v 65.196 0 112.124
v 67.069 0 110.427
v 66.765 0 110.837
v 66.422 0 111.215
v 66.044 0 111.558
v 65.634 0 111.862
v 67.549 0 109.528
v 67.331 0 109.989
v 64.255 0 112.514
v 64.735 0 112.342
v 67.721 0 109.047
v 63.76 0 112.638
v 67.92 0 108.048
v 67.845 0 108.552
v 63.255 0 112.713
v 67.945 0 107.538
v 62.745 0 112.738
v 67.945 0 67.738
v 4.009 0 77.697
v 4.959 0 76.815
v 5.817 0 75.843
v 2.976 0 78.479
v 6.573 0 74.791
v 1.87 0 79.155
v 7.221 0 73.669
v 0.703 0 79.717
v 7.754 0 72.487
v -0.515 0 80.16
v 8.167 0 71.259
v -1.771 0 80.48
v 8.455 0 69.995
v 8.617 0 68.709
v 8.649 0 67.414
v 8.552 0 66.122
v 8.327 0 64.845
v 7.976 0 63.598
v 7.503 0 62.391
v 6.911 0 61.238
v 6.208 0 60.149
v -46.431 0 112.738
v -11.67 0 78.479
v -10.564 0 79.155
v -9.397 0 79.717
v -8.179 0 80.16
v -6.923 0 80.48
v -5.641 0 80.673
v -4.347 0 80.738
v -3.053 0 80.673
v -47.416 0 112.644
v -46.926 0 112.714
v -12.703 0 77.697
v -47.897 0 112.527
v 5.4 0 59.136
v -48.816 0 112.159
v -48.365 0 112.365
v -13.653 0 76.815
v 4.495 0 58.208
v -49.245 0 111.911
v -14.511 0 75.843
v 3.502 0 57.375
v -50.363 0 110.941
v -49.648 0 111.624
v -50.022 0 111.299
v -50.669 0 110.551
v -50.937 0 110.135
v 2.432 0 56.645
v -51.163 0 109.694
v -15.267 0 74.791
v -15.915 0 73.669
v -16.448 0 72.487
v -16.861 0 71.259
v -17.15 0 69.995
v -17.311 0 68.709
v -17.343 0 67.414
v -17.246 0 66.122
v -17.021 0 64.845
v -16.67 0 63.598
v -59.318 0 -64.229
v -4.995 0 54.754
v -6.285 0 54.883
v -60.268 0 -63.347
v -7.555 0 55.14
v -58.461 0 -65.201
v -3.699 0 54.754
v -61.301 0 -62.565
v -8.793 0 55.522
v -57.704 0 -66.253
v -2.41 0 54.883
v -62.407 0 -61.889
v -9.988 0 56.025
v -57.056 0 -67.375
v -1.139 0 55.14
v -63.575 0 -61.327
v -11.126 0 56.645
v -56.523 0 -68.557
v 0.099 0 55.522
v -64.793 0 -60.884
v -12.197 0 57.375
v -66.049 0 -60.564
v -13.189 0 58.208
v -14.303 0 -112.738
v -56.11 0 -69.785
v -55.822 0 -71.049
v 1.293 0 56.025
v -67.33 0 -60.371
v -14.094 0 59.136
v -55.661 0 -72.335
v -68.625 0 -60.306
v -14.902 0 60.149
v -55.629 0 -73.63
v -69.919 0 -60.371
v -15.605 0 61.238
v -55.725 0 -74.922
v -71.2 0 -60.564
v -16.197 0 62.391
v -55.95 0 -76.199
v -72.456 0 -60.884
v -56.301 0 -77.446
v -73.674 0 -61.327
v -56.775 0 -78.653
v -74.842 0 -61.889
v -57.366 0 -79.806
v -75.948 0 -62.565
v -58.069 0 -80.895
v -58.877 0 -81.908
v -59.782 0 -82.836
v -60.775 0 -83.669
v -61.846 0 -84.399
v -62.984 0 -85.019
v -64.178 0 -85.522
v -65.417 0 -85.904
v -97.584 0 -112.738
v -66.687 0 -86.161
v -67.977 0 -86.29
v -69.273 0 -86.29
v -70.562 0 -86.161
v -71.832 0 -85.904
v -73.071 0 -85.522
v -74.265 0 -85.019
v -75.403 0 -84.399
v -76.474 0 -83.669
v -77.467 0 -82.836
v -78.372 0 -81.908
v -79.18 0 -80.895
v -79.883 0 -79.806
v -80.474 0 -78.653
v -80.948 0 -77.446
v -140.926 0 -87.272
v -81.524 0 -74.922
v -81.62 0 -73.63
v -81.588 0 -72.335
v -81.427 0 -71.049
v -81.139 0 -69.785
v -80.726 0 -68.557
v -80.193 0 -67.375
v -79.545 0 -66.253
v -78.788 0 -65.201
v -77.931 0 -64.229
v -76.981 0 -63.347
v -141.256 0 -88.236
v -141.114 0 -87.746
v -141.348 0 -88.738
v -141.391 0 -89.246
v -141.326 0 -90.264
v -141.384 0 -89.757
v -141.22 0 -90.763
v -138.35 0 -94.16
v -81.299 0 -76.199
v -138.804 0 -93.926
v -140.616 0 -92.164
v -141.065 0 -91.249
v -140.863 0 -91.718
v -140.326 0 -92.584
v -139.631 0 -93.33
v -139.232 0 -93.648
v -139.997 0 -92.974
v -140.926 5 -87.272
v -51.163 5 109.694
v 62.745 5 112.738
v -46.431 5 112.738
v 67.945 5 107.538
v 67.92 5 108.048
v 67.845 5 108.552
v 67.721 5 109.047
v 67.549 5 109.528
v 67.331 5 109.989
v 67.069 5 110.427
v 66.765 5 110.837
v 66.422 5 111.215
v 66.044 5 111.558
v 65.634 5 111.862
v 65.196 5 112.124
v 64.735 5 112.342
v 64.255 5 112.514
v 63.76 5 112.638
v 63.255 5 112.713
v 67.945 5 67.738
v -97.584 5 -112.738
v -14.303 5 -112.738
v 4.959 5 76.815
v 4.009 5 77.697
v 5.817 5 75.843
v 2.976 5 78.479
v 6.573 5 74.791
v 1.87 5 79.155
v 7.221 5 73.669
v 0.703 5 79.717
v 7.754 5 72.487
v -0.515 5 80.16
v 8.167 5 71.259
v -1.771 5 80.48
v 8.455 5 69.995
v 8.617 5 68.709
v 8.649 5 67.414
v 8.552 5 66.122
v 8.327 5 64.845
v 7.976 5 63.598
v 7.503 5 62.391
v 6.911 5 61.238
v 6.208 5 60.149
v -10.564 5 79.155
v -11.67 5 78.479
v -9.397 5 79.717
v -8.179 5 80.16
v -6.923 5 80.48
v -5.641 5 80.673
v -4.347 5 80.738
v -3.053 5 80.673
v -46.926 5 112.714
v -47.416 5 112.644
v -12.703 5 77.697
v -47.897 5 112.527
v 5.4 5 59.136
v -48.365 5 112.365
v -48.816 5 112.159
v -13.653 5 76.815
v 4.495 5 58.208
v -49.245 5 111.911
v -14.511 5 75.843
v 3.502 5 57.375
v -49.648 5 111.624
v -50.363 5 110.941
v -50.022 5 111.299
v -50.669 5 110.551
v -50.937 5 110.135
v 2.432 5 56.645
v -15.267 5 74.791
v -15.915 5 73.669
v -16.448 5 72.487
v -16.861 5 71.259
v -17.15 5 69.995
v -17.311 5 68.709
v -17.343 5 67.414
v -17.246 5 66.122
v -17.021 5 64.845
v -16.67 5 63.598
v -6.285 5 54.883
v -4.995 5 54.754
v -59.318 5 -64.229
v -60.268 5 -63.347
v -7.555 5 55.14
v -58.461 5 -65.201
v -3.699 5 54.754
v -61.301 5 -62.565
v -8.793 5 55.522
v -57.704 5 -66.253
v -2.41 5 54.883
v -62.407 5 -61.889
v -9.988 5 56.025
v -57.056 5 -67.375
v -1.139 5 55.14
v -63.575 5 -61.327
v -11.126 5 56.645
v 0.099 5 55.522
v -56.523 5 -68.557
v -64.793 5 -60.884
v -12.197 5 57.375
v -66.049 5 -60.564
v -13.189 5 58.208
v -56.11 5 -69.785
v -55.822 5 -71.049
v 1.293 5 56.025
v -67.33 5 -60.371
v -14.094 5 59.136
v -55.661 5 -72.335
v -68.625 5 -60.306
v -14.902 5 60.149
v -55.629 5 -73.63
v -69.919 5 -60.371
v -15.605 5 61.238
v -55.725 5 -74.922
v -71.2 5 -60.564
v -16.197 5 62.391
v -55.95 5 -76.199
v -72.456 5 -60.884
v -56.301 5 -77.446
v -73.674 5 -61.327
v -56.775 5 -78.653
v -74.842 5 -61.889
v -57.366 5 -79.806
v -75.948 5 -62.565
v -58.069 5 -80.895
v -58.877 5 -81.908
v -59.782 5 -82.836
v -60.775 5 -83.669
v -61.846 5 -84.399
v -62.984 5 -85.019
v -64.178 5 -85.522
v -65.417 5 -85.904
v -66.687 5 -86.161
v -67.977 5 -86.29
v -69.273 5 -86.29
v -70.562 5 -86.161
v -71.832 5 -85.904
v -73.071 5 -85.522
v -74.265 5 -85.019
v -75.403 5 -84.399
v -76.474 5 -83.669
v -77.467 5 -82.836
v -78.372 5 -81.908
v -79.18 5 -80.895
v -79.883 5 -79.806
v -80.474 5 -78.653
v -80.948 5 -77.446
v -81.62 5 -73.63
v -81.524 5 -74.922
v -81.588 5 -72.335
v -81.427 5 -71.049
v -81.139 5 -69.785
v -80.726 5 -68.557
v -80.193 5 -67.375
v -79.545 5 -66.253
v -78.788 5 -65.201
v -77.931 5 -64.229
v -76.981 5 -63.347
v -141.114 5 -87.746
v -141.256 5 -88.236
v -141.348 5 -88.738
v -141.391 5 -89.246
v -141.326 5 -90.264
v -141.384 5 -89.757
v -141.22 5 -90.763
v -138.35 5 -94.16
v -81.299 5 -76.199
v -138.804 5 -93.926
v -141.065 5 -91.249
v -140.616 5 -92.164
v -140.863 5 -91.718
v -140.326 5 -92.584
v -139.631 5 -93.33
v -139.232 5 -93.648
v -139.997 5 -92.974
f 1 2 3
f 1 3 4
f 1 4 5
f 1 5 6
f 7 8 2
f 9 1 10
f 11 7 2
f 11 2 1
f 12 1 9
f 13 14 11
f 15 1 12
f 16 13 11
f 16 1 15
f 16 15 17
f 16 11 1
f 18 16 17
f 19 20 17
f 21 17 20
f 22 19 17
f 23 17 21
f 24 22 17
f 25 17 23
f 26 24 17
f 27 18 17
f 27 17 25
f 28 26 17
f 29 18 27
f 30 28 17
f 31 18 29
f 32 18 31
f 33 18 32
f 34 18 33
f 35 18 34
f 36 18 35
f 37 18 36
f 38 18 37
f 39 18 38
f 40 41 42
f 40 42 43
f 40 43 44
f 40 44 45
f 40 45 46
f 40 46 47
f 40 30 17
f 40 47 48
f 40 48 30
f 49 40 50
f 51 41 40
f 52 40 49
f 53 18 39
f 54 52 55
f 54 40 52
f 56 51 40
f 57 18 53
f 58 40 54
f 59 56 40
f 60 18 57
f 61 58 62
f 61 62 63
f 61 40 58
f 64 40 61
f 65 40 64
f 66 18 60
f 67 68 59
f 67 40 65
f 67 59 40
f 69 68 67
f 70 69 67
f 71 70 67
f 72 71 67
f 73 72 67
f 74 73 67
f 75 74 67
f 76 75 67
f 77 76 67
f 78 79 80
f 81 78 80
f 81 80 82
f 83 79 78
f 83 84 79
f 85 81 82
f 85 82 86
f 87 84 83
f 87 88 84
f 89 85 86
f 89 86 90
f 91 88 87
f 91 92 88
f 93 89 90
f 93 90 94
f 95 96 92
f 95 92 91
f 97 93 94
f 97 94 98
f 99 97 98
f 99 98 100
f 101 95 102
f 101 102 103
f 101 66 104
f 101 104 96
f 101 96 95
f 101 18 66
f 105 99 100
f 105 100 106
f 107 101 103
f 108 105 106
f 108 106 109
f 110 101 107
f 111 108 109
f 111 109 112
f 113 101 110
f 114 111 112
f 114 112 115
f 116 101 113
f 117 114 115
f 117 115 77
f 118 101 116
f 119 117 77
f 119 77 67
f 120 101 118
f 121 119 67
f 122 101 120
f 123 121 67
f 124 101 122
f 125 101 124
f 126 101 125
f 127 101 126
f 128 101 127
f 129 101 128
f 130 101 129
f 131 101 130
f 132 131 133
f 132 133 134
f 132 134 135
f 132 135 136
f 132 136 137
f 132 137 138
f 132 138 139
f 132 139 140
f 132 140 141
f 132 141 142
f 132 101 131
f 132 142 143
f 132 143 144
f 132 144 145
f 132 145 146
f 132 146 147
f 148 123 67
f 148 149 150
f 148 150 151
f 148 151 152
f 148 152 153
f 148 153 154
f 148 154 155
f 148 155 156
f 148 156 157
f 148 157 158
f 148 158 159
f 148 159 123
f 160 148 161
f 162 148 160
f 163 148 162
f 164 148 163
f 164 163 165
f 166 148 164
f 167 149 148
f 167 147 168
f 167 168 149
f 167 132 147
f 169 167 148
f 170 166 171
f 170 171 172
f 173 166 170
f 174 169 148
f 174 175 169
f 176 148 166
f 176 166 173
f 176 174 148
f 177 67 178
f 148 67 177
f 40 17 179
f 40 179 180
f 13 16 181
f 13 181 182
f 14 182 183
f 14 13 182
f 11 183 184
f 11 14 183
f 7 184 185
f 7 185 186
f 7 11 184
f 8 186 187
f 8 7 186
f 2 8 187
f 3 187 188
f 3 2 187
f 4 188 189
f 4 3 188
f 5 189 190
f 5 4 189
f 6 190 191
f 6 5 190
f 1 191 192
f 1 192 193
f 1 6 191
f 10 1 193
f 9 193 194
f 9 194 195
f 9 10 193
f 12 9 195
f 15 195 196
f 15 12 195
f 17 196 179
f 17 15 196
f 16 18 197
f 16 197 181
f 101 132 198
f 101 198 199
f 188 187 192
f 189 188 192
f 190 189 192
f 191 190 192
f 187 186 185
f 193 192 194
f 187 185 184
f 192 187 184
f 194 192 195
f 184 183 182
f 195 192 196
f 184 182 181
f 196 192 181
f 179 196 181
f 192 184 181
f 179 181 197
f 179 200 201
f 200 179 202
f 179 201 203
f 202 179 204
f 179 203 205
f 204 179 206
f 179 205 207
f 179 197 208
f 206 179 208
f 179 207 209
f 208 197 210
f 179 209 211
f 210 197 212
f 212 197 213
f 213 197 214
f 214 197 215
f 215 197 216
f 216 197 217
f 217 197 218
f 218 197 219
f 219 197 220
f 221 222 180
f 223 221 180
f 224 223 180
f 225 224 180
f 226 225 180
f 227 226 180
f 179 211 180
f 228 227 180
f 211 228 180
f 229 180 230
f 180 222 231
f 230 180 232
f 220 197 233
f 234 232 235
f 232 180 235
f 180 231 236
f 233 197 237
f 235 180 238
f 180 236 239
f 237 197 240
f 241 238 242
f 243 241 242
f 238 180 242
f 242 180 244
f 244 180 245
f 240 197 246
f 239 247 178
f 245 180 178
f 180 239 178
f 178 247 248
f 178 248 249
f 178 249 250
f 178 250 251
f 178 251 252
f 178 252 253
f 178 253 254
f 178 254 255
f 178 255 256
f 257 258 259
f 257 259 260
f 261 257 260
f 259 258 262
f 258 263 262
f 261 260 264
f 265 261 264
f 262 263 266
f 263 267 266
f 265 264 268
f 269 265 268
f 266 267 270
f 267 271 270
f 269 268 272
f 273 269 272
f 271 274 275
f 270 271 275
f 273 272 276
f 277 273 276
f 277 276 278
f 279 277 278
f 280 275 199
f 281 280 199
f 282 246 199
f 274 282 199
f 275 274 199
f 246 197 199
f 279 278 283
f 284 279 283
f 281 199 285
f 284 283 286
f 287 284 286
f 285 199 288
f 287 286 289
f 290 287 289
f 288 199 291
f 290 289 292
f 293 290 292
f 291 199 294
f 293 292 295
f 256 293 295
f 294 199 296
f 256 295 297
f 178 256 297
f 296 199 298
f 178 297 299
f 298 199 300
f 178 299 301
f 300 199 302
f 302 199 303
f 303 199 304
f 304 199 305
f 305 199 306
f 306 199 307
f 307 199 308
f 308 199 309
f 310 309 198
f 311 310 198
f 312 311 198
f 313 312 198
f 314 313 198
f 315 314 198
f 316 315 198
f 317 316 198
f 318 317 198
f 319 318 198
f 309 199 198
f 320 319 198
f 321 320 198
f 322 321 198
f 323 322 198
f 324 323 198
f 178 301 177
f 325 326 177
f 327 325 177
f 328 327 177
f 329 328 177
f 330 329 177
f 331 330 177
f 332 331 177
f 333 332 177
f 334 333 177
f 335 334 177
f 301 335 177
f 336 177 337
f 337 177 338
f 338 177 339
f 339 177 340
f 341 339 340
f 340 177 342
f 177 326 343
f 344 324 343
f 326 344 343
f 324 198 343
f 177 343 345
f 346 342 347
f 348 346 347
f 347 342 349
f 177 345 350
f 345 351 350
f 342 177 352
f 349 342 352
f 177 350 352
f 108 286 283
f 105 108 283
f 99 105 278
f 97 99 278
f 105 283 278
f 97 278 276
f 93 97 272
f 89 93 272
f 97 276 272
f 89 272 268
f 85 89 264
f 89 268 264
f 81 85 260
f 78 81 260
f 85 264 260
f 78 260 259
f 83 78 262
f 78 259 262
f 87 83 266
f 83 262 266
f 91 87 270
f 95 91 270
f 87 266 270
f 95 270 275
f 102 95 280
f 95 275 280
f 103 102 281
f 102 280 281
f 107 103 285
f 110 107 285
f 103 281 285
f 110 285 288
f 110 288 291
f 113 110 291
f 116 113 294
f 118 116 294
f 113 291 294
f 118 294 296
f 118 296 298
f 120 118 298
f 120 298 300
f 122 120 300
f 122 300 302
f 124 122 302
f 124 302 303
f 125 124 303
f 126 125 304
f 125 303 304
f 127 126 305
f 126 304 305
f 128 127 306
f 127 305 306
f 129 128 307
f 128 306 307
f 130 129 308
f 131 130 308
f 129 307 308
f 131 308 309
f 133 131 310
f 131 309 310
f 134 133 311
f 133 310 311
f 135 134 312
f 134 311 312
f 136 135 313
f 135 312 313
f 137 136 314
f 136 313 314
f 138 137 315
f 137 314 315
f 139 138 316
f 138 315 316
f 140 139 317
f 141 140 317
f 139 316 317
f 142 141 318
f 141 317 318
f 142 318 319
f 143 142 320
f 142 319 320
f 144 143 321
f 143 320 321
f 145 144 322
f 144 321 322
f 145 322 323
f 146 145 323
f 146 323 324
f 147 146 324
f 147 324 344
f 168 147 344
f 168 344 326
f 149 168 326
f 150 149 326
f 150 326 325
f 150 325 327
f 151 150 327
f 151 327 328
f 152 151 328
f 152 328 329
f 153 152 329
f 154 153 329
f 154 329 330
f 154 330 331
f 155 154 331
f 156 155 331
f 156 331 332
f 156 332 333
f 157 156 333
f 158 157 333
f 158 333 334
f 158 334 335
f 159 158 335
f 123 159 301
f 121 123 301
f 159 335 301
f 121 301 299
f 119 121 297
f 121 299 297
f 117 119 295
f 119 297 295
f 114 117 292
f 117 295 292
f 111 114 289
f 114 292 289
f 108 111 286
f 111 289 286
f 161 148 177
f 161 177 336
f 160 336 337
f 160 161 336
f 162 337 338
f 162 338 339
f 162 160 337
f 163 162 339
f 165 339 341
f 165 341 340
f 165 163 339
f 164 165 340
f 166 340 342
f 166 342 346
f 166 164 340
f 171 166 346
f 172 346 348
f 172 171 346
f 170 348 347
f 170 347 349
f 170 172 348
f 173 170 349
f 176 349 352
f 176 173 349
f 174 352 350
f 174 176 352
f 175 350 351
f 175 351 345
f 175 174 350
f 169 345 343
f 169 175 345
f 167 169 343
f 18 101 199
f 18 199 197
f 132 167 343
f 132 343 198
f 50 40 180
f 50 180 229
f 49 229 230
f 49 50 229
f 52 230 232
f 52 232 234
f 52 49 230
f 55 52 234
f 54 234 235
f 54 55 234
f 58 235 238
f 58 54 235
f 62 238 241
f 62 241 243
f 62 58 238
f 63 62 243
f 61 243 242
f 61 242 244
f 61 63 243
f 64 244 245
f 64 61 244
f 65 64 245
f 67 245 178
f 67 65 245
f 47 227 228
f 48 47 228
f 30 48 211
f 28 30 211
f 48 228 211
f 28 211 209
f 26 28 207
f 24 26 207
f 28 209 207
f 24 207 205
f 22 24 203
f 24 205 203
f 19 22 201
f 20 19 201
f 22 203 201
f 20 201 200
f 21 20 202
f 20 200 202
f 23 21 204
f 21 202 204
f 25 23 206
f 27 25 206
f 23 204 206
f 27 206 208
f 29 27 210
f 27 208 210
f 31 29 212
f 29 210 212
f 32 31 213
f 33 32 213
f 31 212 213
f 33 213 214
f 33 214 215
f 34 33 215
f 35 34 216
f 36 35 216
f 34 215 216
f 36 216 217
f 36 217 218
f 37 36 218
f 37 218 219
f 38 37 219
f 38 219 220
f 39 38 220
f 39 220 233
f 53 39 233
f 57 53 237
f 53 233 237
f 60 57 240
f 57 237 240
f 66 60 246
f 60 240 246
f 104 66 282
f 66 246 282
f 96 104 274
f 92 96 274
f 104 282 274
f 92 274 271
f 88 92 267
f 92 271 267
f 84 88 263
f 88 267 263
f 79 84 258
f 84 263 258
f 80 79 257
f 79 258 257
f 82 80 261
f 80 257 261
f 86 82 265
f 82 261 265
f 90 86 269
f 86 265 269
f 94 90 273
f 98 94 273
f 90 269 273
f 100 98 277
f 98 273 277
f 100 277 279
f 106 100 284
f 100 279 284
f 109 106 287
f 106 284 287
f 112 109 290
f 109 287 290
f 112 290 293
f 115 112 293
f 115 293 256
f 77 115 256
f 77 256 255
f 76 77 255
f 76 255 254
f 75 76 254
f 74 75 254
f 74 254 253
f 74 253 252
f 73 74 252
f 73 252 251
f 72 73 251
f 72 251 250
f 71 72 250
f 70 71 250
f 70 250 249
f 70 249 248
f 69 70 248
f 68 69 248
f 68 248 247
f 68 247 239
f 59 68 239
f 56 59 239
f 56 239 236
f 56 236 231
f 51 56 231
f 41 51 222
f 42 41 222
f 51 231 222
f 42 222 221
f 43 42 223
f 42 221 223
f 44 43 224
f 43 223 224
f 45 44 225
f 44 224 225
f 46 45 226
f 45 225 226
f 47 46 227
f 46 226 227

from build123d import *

# Parameters (mm, degrees)
BOSS_EXTRUDE1_DEPTH = 5
SKETCH2_R           = 13
CUT_EXTRUDE1_DEPTH  = 5


with BuildPart() as part:
    # Sketch1 → Boss-Extrude1 (new body)
    with BuildSketch(Plane(origin=(0, 0, 0), x_dir=(1, 0, 0), z_dir=(0, 1, 0))):
        with BuildLine():
            Line((67.945120995, -67.73797404), (67.945120995, -107.53797404))
            ThreePointArc((67.945120995, -107.53797404), (66.422076258, -111.214929302), (62.745120995, -112.73797404))
            Line((62.745120995, -112.73797404), (-46.431495334, -112.73797404))
            ThreePointArc((-46.431495334, -112.73797404), (-49.244562585, -111.911376907), (-51.163293943, -109.694378902))
            Line((-51.163293943, -109.694378902), (-140.925822463, 87.271513299))
            ThreePointArc((-140.925822463, 87.271513299), (-141.064719238, 91.248996543), (-138.350428716, 94.159716769))
            Line((-138.350428716, 94.159716769), (-97.584163781, 112.73797404))
            Line((-97.584163781, 112.73797404), (-14.302507037, 112.73797404))
            Line((-14.302507037, 112.73797404), (67.945120995, -67.73797404))
        make_face()
    extrude(amount=BOSS_EXTRUDE1_DEPTH)

    # Sketch2 → Cut-Extrude1 (cut)
    with BuildSketch(Plane(origin=(0, 5, 0), x_dir=(1, 0, 0), z_dir=(0, 1, 0))):
        with Locations(Location((-4.347057053, -67.73797404, 0), (0, 0, 270))):
            Circle(SKETCH2_R)
        with Locations(Location((-68.624509665, 73.306022946, 0), (0, 0, 270))):
            Circle(SKETCH2_R)
    extrude(amount=-CUT_EXTRUDE1_DEPTH, mode=Mode.SUBTRACT)


solid = part.part
